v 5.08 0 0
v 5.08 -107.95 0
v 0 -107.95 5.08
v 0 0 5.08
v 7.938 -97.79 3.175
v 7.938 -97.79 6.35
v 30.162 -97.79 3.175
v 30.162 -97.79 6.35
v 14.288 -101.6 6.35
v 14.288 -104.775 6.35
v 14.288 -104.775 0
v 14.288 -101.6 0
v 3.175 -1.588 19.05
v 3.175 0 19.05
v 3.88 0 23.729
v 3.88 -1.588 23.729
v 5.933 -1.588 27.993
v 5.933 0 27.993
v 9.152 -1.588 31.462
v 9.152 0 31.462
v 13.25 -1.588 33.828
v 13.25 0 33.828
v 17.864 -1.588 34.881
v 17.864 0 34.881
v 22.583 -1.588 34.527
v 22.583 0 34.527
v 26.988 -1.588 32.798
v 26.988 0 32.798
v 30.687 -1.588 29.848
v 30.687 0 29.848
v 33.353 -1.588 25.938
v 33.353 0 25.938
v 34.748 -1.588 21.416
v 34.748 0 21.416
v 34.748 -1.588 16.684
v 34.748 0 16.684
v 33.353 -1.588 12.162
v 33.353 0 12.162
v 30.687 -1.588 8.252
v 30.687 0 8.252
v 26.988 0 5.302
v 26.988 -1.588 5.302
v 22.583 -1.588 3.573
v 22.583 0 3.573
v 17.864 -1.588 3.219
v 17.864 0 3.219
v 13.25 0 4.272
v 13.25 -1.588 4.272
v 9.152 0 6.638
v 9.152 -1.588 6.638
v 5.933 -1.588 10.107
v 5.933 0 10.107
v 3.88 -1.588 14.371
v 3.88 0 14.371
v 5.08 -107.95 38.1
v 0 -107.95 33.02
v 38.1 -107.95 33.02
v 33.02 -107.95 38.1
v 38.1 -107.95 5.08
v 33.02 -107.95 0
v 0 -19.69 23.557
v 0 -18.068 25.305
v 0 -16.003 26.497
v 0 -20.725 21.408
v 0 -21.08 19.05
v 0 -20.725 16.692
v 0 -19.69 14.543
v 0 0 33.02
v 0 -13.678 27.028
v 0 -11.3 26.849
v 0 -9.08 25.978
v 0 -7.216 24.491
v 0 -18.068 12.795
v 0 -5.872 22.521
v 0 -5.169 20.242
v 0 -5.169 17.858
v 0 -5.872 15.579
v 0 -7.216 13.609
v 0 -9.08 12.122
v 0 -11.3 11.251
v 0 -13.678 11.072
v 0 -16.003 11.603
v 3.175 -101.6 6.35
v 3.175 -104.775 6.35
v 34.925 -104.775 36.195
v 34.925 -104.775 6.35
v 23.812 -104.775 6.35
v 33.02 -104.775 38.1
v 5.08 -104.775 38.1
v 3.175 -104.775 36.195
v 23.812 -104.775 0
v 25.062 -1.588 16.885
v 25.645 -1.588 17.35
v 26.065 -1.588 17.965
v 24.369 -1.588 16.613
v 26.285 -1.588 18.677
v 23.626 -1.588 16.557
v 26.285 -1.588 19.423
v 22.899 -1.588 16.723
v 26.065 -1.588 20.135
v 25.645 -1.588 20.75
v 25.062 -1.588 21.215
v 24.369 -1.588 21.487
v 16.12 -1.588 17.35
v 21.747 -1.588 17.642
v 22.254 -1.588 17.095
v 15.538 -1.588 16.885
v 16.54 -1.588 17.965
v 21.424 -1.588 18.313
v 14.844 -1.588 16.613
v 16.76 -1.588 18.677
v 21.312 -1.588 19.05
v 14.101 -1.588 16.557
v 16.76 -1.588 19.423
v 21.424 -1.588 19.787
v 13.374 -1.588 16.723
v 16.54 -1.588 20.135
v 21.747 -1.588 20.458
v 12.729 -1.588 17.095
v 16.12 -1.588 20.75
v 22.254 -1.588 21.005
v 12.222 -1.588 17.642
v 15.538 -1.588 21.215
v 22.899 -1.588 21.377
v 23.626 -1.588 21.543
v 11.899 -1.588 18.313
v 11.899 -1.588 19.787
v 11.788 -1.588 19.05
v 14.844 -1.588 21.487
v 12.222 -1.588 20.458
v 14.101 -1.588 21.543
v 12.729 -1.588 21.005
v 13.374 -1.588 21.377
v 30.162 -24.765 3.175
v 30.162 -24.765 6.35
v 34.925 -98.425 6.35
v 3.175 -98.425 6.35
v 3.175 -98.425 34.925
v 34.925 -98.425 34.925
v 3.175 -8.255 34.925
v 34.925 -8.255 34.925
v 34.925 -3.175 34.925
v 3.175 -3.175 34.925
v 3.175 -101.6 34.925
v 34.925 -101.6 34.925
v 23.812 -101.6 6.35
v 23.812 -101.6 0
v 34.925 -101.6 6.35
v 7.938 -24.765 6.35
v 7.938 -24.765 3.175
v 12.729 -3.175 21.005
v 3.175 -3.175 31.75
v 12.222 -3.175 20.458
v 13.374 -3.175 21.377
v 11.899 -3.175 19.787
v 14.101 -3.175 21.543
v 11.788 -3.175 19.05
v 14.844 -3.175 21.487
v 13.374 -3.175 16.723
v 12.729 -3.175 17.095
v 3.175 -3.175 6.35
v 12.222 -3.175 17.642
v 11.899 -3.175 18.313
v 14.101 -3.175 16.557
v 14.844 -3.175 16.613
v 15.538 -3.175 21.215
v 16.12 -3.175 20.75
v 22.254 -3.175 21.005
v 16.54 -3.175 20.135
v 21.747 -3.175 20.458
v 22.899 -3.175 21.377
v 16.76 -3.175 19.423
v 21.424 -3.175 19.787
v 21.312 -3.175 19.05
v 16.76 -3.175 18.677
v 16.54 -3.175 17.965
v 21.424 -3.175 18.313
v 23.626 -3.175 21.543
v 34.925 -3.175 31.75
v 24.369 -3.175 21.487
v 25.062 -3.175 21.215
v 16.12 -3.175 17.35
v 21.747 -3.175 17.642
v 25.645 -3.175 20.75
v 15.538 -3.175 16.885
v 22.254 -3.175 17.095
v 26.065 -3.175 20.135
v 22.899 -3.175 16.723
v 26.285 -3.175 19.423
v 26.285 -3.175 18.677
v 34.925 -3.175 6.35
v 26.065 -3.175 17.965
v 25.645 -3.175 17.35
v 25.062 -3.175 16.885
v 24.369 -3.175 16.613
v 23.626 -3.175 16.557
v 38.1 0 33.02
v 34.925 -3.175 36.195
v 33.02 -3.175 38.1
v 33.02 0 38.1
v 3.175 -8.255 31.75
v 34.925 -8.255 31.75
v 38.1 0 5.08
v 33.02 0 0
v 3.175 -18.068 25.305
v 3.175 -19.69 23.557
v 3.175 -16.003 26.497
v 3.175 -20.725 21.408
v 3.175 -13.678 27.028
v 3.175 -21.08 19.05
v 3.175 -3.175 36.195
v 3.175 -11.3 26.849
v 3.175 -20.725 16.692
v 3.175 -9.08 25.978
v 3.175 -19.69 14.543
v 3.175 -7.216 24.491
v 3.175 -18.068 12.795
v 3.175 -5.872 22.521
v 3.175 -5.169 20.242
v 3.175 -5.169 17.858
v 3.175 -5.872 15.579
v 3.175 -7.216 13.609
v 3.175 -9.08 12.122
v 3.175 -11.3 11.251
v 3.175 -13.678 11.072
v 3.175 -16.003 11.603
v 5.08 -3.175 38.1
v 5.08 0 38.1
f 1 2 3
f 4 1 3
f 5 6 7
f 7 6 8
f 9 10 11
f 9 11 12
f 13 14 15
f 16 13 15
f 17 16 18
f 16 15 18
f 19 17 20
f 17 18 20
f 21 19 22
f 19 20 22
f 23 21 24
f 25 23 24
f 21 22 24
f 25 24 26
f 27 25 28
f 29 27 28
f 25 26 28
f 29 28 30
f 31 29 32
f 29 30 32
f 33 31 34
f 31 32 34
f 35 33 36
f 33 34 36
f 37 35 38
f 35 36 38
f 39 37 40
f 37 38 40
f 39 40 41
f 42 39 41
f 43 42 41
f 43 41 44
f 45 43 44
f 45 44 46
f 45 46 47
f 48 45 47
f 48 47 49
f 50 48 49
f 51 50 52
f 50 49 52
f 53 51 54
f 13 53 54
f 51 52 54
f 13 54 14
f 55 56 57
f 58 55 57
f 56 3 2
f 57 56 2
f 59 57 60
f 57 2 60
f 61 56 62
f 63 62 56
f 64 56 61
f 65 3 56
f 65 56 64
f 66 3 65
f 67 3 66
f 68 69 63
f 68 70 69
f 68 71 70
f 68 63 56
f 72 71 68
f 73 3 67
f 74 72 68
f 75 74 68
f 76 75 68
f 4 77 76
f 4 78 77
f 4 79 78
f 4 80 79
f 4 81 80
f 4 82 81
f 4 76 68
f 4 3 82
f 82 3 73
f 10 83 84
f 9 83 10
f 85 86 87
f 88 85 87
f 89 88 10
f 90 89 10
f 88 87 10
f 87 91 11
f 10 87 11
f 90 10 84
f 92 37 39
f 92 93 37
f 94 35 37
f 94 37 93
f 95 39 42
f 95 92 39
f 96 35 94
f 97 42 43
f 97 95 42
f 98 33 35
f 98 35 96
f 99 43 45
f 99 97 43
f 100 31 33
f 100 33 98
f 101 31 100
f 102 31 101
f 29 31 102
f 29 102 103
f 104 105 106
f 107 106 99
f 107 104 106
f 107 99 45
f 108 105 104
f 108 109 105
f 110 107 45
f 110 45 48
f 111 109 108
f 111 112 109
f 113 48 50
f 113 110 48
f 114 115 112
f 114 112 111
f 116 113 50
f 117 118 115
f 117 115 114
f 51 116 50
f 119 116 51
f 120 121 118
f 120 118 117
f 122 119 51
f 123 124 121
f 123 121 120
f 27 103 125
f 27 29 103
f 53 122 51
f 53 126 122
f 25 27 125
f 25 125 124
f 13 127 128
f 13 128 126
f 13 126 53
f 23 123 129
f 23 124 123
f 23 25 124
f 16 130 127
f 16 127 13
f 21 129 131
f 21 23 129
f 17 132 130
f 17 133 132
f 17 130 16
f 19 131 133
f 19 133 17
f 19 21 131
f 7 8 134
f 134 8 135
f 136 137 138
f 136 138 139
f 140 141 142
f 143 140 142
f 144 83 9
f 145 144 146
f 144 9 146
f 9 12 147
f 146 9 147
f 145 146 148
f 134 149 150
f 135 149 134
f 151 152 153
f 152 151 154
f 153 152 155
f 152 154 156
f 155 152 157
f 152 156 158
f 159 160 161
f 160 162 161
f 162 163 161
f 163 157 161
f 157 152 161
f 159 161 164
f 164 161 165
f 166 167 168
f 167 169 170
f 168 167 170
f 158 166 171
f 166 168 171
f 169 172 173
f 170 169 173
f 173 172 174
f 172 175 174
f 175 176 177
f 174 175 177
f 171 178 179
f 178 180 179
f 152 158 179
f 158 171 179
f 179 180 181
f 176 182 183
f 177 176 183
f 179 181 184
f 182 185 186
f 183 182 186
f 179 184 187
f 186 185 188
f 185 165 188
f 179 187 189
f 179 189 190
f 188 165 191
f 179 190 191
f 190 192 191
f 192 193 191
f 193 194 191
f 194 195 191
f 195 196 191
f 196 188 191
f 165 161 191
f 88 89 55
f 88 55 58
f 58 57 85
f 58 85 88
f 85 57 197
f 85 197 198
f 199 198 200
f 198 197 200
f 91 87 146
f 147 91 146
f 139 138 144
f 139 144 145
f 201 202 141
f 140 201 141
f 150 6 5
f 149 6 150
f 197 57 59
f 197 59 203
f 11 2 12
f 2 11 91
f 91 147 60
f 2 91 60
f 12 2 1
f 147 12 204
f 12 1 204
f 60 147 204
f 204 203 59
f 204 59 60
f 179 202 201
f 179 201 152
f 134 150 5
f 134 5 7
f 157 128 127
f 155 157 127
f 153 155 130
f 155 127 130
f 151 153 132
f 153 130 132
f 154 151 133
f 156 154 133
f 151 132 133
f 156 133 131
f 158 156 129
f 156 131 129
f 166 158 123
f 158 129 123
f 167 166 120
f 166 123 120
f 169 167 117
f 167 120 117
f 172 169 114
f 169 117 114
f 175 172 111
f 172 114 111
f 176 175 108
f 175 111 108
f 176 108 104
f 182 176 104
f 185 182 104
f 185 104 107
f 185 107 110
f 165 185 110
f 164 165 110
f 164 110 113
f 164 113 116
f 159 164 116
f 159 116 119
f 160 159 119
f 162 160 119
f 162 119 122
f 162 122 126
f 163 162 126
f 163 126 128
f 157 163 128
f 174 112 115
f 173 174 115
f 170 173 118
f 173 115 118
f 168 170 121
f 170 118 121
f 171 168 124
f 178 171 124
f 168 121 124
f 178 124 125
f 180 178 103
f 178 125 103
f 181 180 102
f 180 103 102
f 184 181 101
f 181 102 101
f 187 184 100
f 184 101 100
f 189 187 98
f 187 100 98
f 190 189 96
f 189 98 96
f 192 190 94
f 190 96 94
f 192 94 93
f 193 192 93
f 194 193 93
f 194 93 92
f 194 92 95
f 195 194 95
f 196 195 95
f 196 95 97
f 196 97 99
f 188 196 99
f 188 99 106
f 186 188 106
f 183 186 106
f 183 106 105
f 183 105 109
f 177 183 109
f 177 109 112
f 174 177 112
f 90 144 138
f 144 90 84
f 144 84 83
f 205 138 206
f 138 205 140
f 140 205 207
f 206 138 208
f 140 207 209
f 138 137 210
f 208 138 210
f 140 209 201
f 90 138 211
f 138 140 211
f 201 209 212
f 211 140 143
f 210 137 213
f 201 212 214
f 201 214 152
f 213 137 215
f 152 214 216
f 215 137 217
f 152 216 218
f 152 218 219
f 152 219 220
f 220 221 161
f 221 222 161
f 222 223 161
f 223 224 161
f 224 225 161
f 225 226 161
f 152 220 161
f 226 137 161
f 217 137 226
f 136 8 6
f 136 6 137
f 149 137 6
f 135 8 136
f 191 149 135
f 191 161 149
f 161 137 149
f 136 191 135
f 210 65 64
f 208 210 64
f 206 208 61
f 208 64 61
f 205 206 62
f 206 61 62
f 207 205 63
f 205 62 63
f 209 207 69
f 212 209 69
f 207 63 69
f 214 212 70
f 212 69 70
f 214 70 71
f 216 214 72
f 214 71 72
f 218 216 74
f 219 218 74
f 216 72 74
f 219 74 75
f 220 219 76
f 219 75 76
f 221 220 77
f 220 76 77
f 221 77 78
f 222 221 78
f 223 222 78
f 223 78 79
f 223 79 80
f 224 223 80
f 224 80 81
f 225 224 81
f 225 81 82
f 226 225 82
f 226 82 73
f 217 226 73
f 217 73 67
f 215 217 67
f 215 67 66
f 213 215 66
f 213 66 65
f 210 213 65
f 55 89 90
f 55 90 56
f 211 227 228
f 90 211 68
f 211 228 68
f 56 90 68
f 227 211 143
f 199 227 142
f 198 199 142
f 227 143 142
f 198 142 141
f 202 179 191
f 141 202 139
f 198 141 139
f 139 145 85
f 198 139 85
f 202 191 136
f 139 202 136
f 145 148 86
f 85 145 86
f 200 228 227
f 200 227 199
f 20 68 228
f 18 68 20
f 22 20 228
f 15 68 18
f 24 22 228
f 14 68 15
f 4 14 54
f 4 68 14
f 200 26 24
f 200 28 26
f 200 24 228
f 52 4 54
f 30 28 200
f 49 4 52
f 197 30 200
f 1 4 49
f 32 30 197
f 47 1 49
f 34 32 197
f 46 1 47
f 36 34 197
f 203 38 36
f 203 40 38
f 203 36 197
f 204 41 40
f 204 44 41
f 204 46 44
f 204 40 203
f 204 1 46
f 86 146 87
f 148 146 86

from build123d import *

# Parameters (mm, degrees)
F0_W         = 38.1
F0_H         = 107.95
F1_DEPTH     = 6.35
F2_W         = 22.225
F2_H         = 73.025
F3_DEPTH     = 3.175
F4_W         = 38.1
F4_H         = 107.95
F4_W_2       = 31.75
F4_H_2       = 3.175
F5_DEPTH     = 31.75
F6_R         = 15.875
F6_R_2       = 2.5
F7_DEPTH     = 1.5875
F8_R         = 2.5
F9_DEPTH     = 25.4
F10_R        = 8
F11_DEPTH    = 25.4
F12_W        = 9.525
F12_H        = 3.175
F13_DEPTH    = 25.4
F14_W        = 31.75
F14_H        = 3.175
F15_DEPTH    = 3.175
F16_W        = 5.08
F16_H        = 3.175
F17_DEPTH    = 38.1
F18_T1_DEPTH = 134.0782991577


# Not quite as in the source:
# - a fillet or chamfer that OpenCascade refuses, or shapes differently, is made with other operations: its cross-section is extruded or revolved along the edge and cut away or added


with BuildPart() as f1:
    # F0 (on Top) → F1 (new body)
    with BuildSketch(Plane.XY):
        with Locations((19.05, -53.975)):
            Rectangle(F0_W, F0_H)
    extrude(amount=F1_DEPTH)

    # F2 (on face) → F3 (cut)
    with BuildSketch(Plane.XY.offset(6.35)):
        with Locations((19.05, -61.2775)):
            Rectangle(F2_W, F2_H)
    extrude(amount=-F3_DEPTH, mode=Mode.SUBTRACT)

    # F4 (on face) → F5 (join)
    with BuildSketch(Plane.XY.offset(6.35)):
        with Locations((19.05, -53.975)):
            Rectangle(F4_W, F4_H)
        Polygon((3.175, -98.425), (3.175, -3.175), (34.925, -3.175), (34.925, -98.425), (34.925, -101.6), (34.925, -104.775), (3.175, -104.775), (3.175, -101.6), align=None, mode=Mode.SUBTRACT)
        with Locations((19.05, -100.0125)):
            Rectangle(F4_W_2, F4_H_2)
    extrude(amount=F5_DEPTH)

    # F6 (on face) → F7 (cut)
    with BuildSketch(Plane(origin=(0, 0, 0), x_dir=(-1, 0, 0), z_dir=(0, 1, 0))):
        with Locations((-19.05, 19.05)):
            Circle(F6_R)
        with Locations((-23.8125, 19.05)):
            Circle(F6_R_2, mode=Mode.SUBTRACT)
        with Locations((-14.2875, 19.05)):
            Circle(F6_R_2, mode=Mode.SUBTRACT)
    extrude(amount=-F7_DEPTH, mode=Mode.SUBTRACT)

    # F8 (on face) → F9 (cut)
    with BuildSketch(Plane(origin=(0, 0, 0), x_dir=(-1, 0, 0), z_dir=(0, 1, 0))):
        with Locations((-14.2875, 19.05)):
            Circle(F8_R)
        with Locations((-23.8125, 19.05)):
            Circle(F8_R)
    extrude(amount=-F9_DEPTH, mode=Mode.SUBTRACT)

    # F10 (on face) → F11 (cut)
    with BuildSketch(Plane(origin=(0, 0, 0), x_dir=(0, -1, 0), z_dir=(-1, 0, 0))):
        with Locations((13.08, 19.05)):
            Circle(F10_R)
    extrude(amount=-F11_DEPTH, mode=Mode.SUBTRACT)

    # F12 (on face) → F13 (cut)
    with BuildSketch(Plane.XY.offset(6.35)):
        with Locations((19.05, -103.1875)):
            Rectangle(F12_W, F12_H)
    extrude(amount=-F13_DEPTH, mode=Mode.SUBTRACT)

    # F14 (on face) → F15 (cut)
    with BuildSketch(Plane.XY.offset(38.1)):
        with Locations((19.05, -100.0125)):
            Rectangle(F14_W, F14_H)
    extrude(amount=-F15_DEPTH, mode=Mode.SUBTRACT)

    # F16 (on face) → F17 (join)
    with BuildSketch(Plane.YZ.offset(38.1)):
        with Locations((-5.715, 33.3375)):
            Rectangle(F16_W, F16_H)
    extrude(amount=-F17_DEPTH)

    # F18: chamfer of 5.08 on 4 edges, made by hand

    # F18_s2 → F18_t1 (cut)
    with BuildSketch(Plane.XZ.offset(-13.0641495789)):
        Polygon((38.1, 5.08), (33.02, 0), (38.1, 0), align=None)
        Polygon((38.1, 33.02), (33.02, 38.1), (38.1, 38.1), align=None)
        Polygon((5.08, 38.1), (0, 33.02), (0, 38.1), align=None)
        Polygon((5.08, 0), (0, 5.08), (0, 0), align=None)
    extrude(amount=F18_T1_DEPTH, mode=Mode.SUBTRACT)


solid = f1.part
